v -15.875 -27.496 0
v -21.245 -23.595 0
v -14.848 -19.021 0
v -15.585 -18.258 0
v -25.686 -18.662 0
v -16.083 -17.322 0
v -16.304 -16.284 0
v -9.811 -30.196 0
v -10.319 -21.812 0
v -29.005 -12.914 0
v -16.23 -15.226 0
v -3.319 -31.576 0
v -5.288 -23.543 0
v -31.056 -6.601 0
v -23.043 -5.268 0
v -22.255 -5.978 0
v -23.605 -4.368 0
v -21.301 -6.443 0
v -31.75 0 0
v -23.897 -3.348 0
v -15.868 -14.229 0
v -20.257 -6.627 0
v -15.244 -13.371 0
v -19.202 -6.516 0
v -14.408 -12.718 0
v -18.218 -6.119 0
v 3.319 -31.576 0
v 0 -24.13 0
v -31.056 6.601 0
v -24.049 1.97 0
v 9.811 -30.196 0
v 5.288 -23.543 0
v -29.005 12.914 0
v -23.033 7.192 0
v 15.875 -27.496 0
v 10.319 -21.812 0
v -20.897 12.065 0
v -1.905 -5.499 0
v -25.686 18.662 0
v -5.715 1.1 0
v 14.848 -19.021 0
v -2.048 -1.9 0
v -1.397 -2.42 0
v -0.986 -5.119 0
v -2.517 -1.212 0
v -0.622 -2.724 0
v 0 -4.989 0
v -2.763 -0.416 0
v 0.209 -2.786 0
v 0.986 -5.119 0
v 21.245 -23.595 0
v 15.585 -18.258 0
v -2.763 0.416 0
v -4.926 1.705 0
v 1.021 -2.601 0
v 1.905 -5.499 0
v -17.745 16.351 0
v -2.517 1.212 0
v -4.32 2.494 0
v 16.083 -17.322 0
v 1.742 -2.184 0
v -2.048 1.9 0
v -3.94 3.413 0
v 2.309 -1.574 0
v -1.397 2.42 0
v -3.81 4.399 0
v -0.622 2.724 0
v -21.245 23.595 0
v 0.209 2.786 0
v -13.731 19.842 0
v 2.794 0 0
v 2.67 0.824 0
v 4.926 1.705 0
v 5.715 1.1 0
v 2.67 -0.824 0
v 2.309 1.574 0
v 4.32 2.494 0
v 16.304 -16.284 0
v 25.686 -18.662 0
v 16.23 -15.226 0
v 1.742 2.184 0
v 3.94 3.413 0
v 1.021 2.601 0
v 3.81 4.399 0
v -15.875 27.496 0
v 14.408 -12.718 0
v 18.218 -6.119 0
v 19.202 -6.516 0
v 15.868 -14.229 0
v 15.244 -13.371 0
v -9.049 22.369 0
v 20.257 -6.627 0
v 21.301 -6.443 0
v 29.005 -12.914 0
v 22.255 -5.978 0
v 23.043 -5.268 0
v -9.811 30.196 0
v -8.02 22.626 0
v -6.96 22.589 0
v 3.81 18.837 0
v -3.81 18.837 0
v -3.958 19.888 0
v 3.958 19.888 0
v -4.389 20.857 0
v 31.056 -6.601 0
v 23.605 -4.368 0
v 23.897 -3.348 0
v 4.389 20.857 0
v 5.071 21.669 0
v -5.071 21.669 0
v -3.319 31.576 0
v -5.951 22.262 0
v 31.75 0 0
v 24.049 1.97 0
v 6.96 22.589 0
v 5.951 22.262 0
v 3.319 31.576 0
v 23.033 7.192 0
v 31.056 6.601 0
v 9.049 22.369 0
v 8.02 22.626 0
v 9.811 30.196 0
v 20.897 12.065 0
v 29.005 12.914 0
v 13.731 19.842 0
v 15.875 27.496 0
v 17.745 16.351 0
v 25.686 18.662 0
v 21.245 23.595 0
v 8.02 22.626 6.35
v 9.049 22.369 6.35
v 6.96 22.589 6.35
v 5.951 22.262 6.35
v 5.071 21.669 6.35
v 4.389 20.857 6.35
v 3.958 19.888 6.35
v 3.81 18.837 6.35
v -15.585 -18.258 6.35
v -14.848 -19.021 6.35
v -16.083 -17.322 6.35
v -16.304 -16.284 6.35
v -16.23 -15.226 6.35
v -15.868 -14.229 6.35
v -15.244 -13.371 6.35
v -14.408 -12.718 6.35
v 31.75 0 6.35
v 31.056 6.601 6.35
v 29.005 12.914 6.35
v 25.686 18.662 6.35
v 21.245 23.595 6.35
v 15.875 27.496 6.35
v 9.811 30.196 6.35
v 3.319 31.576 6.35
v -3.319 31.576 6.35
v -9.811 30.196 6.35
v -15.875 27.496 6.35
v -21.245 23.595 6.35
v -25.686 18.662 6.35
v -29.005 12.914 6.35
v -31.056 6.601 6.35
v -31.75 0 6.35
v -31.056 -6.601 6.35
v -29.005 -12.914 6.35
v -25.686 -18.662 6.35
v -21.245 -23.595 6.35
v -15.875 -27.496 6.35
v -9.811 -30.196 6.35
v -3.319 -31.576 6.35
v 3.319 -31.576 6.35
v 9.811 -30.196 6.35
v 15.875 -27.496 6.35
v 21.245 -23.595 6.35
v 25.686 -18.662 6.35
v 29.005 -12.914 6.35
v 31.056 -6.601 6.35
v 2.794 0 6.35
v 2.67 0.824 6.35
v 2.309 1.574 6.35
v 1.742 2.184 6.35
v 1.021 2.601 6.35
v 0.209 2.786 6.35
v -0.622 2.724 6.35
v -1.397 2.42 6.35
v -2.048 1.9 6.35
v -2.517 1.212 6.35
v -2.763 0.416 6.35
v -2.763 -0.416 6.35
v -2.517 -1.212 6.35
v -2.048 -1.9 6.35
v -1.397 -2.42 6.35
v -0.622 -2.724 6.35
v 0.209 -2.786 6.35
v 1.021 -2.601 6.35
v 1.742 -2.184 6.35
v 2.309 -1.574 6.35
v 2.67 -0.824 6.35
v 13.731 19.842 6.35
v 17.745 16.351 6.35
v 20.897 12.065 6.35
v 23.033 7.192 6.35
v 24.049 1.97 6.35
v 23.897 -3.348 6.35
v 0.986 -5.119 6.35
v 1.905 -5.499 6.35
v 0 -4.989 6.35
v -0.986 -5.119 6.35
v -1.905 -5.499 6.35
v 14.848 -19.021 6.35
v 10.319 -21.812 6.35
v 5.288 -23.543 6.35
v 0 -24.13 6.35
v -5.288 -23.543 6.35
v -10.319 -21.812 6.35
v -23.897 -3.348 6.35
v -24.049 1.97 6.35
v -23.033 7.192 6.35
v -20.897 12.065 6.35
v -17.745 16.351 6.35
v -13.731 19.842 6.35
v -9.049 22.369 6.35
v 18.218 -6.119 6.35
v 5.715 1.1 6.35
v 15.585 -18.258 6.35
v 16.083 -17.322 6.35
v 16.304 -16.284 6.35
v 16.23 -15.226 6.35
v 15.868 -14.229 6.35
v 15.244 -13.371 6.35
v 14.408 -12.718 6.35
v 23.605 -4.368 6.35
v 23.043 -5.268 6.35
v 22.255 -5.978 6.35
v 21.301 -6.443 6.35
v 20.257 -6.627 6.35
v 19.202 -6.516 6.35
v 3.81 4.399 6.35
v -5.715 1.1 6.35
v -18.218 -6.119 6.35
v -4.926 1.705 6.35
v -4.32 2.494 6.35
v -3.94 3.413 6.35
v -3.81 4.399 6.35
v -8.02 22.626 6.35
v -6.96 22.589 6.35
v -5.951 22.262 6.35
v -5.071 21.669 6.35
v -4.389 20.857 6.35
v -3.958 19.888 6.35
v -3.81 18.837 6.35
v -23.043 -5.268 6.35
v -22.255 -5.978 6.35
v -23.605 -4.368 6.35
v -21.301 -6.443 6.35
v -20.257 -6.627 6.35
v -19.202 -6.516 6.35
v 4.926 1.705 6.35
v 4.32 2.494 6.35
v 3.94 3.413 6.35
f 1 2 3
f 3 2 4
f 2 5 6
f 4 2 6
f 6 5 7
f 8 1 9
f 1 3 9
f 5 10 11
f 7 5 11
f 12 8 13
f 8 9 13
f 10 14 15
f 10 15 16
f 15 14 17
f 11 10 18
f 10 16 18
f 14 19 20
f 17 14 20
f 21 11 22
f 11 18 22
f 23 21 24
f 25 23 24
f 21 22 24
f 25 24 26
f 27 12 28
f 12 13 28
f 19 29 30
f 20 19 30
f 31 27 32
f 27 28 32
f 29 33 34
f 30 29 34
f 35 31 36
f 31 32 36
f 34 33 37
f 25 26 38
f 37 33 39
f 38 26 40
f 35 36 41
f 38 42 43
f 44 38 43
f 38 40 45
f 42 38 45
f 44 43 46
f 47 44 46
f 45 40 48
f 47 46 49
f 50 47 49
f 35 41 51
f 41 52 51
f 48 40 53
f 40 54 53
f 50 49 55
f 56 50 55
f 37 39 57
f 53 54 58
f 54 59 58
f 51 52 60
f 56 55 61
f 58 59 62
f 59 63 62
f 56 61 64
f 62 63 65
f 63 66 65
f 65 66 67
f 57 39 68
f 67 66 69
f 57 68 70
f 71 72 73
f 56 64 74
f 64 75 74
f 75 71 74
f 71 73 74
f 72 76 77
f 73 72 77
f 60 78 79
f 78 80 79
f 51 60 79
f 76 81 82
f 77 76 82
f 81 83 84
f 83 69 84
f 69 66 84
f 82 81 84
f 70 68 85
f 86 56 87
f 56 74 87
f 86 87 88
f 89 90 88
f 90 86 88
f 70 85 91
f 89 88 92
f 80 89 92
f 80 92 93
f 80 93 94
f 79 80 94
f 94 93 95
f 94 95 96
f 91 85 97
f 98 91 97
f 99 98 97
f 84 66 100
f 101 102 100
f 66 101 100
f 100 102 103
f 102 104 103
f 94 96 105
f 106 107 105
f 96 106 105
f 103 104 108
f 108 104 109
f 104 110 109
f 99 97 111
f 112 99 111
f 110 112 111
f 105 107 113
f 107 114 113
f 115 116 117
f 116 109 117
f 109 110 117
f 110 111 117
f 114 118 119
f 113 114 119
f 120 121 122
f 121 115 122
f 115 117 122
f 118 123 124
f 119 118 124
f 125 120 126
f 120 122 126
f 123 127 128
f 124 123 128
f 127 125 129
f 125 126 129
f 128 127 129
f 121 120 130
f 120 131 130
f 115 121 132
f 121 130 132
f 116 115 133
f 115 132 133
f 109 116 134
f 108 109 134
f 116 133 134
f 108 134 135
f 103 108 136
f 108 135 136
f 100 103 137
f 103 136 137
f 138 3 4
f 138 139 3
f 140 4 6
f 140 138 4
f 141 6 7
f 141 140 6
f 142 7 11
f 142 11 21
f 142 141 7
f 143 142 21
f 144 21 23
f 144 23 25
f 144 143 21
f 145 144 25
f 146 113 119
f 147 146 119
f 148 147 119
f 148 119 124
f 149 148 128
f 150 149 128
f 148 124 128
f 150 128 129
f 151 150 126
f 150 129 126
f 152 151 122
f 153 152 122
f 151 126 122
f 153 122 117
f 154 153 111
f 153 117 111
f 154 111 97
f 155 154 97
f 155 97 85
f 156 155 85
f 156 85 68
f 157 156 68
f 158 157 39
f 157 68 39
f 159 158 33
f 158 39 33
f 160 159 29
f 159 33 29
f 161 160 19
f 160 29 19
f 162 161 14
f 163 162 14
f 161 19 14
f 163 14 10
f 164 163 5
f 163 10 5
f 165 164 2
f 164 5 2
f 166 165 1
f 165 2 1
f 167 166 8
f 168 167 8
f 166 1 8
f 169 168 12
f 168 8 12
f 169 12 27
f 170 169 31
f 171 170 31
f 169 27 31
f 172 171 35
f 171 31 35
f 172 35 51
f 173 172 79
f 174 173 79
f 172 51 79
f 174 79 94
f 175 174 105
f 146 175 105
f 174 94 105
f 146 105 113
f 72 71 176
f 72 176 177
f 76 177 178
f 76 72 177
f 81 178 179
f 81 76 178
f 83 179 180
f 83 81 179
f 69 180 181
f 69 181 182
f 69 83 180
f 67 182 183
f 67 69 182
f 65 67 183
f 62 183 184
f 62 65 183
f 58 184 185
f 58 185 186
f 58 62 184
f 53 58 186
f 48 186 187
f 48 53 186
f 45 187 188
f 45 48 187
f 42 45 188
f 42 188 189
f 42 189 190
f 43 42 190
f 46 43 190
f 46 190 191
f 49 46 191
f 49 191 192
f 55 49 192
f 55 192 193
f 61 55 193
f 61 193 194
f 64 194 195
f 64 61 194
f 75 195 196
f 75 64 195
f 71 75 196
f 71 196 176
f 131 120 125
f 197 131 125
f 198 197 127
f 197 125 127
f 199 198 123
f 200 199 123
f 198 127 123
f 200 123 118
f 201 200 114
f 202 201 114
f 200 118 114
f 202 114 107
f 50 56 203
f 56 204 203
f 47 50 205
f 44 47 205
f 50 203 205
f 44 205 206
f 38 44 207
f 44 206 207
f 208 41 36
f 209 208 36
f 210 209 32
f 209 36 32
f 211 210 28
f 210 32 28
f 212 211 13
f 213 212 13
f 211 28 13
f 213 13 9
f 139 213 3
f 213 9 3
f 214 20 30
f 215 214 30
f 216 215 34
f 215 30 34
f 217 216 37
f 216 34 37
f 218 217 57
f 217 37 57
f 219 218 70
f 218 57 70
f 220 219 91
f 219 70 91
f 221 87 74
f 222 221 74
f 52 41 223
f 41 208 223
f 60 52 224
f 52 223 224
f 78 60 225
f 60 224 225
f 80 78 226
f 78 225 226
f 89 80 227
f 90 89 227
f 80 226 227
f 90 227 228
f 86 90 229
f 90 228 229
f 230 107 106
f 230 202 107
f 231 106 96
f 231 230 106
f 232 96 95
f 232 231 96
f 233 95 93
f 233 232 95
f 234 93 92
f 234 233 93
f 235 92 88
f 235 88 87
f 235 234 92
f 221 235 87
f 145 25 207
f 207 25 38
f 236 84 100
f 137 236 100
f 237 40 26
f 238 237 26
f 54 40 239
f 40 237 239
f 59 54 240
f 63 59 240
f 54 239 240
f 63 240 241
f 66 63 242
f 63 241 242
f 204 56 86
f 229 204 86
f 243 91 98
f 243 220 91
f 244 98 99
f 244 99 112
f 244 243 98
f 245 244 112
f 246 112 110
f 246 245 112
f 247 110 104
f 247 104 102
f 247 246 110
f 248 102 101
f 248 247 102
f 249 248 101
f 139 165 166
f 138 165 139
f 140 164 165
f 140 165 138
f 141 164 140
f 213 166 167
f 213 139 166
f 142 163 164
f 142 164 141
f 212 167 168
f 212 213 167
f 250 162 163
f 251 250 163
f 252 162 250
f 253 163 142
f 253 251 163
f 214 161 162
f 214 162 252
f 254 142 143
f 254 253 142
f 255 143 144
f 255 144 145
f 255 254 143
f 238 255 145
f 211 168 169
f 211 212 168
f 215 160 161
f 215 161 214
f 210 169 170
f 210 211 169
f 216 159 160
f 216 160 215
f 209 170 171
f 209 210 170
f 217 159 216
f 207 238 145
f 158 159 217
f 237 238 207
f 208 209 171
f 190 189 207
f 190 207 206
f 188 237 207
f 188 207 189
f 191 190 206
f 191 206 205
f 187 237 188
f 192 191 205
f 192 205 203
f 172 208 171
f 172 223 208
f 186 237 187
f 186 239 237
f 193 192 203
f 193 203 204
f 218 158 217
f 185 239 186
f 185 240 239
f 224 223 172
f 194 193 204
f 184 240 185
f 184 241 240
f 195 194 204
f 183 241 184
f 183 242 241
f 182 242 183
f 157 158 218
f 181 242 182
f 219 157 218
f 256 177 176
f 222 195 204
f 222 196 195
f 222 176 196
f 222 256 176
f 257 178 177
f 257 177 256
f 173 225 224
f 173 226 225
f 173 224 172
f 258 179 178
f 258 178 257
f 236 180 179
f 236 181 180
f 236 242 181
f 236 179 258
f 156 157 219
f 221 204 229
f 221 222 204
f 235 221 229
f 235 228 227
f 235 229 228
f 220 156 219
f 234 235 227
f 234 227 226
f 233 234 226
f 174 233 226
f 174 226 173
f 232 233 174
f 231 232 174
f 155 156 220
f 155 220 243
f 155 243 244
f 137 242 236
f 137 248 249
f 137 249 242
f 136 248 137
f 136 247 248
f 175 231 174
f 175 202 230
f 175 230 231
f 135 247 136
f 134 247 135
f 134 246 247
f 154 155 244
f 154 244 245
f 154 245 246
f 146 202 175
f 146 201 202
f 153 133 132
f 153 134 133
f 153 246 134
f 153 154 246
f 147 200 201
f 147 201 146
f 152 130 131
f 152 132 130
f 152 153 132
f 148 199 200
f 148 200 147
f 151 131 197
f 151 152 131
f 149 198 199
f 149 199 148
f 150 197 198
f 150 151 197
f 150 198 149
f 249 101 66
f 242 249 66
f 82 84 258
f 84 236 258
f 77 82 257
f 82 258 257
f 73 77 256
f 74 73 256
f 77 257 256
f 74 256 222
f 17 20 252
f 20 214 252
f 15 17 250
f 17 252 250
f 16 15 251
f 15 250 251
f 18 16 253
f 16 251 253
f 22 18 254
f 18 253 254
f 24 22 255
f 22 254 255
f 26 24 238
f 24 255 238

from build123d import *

# Parameters (mm, degrees)
SKETCH1_R           = 31.75
SKETCH1_R_2         = 2.794
BOSS_EXTRUDE3_DEPTH = 6.35
FILLET1_R           = 3.81


with BuildPart() as part:
    # Sketch1 → Boss-Extrude3 (new body)
    with BuildSketch(Plane.XY):
        Circle(SKETCH1_R)
        with BuildLine():
            Line((-18.730057548, -15.213212818), (0, -4.399409051))
            Line((0, -4.399409051), (18.730057548, -15.213212818))
            ThreePointArc((18.730057548, -15.213212818), (0, -24.13), (-18.730057548, -15.213212818))
        make_face(mode=Mode.SUBTRACT)
        with BuildLine():
            Line((-3.81, 23.82731206), (-3.81, 2.199704526))
            Line((-3.81, 2.199704526), (-22.540057548, -8.614099242))
            ThreePointArc((-22.540057548, -8.614099242), (-20.897192993, 12.065), (-3.81, 23.82731206))
        make_face(mode=Mode.SUBTRACT)
        Circle(SKETCH1_R_2, mode=Mode.SUBTRACT)
        with BuildLine():
            Line((22.540057548, -8.614099242), (3.81, 2.199704526))
            Line((3.81, 2.199704526), (3.81, 23.82731206))
            ThreePointArc((3.81, 23.82731206), (20.897192993, 12.065), (22.540057548, -8.614099242))
        make_face(mode=Mode.SUBTRACT)
    extrude(amount=BOSS_EXTRUDE3_DEPTH)

    # Fillet1
    fillet1_edges = [part.edges().sort_by_distance(p)[0] for p in [
        (18.730057548, -15.213212818, 3.175),
        (0, -4.399409051, 3.175),
        (-18.730057548, -15.213212818, 3.175),
        (3.81, 23.82731206, 3.175),
        (3.81, 2.199704526, 3.175),
        (22.540057548, -8.614099242, 3.175),
        (-22.540057548, -8.614099242, 3.175),
        (-3.81, 2.199704526, 3.175),
        (-3.81, 23.82731206, 3.175),
    ]]
    fillet(fillet1_edges, radius=FILLET1_R)


solid = part.part
